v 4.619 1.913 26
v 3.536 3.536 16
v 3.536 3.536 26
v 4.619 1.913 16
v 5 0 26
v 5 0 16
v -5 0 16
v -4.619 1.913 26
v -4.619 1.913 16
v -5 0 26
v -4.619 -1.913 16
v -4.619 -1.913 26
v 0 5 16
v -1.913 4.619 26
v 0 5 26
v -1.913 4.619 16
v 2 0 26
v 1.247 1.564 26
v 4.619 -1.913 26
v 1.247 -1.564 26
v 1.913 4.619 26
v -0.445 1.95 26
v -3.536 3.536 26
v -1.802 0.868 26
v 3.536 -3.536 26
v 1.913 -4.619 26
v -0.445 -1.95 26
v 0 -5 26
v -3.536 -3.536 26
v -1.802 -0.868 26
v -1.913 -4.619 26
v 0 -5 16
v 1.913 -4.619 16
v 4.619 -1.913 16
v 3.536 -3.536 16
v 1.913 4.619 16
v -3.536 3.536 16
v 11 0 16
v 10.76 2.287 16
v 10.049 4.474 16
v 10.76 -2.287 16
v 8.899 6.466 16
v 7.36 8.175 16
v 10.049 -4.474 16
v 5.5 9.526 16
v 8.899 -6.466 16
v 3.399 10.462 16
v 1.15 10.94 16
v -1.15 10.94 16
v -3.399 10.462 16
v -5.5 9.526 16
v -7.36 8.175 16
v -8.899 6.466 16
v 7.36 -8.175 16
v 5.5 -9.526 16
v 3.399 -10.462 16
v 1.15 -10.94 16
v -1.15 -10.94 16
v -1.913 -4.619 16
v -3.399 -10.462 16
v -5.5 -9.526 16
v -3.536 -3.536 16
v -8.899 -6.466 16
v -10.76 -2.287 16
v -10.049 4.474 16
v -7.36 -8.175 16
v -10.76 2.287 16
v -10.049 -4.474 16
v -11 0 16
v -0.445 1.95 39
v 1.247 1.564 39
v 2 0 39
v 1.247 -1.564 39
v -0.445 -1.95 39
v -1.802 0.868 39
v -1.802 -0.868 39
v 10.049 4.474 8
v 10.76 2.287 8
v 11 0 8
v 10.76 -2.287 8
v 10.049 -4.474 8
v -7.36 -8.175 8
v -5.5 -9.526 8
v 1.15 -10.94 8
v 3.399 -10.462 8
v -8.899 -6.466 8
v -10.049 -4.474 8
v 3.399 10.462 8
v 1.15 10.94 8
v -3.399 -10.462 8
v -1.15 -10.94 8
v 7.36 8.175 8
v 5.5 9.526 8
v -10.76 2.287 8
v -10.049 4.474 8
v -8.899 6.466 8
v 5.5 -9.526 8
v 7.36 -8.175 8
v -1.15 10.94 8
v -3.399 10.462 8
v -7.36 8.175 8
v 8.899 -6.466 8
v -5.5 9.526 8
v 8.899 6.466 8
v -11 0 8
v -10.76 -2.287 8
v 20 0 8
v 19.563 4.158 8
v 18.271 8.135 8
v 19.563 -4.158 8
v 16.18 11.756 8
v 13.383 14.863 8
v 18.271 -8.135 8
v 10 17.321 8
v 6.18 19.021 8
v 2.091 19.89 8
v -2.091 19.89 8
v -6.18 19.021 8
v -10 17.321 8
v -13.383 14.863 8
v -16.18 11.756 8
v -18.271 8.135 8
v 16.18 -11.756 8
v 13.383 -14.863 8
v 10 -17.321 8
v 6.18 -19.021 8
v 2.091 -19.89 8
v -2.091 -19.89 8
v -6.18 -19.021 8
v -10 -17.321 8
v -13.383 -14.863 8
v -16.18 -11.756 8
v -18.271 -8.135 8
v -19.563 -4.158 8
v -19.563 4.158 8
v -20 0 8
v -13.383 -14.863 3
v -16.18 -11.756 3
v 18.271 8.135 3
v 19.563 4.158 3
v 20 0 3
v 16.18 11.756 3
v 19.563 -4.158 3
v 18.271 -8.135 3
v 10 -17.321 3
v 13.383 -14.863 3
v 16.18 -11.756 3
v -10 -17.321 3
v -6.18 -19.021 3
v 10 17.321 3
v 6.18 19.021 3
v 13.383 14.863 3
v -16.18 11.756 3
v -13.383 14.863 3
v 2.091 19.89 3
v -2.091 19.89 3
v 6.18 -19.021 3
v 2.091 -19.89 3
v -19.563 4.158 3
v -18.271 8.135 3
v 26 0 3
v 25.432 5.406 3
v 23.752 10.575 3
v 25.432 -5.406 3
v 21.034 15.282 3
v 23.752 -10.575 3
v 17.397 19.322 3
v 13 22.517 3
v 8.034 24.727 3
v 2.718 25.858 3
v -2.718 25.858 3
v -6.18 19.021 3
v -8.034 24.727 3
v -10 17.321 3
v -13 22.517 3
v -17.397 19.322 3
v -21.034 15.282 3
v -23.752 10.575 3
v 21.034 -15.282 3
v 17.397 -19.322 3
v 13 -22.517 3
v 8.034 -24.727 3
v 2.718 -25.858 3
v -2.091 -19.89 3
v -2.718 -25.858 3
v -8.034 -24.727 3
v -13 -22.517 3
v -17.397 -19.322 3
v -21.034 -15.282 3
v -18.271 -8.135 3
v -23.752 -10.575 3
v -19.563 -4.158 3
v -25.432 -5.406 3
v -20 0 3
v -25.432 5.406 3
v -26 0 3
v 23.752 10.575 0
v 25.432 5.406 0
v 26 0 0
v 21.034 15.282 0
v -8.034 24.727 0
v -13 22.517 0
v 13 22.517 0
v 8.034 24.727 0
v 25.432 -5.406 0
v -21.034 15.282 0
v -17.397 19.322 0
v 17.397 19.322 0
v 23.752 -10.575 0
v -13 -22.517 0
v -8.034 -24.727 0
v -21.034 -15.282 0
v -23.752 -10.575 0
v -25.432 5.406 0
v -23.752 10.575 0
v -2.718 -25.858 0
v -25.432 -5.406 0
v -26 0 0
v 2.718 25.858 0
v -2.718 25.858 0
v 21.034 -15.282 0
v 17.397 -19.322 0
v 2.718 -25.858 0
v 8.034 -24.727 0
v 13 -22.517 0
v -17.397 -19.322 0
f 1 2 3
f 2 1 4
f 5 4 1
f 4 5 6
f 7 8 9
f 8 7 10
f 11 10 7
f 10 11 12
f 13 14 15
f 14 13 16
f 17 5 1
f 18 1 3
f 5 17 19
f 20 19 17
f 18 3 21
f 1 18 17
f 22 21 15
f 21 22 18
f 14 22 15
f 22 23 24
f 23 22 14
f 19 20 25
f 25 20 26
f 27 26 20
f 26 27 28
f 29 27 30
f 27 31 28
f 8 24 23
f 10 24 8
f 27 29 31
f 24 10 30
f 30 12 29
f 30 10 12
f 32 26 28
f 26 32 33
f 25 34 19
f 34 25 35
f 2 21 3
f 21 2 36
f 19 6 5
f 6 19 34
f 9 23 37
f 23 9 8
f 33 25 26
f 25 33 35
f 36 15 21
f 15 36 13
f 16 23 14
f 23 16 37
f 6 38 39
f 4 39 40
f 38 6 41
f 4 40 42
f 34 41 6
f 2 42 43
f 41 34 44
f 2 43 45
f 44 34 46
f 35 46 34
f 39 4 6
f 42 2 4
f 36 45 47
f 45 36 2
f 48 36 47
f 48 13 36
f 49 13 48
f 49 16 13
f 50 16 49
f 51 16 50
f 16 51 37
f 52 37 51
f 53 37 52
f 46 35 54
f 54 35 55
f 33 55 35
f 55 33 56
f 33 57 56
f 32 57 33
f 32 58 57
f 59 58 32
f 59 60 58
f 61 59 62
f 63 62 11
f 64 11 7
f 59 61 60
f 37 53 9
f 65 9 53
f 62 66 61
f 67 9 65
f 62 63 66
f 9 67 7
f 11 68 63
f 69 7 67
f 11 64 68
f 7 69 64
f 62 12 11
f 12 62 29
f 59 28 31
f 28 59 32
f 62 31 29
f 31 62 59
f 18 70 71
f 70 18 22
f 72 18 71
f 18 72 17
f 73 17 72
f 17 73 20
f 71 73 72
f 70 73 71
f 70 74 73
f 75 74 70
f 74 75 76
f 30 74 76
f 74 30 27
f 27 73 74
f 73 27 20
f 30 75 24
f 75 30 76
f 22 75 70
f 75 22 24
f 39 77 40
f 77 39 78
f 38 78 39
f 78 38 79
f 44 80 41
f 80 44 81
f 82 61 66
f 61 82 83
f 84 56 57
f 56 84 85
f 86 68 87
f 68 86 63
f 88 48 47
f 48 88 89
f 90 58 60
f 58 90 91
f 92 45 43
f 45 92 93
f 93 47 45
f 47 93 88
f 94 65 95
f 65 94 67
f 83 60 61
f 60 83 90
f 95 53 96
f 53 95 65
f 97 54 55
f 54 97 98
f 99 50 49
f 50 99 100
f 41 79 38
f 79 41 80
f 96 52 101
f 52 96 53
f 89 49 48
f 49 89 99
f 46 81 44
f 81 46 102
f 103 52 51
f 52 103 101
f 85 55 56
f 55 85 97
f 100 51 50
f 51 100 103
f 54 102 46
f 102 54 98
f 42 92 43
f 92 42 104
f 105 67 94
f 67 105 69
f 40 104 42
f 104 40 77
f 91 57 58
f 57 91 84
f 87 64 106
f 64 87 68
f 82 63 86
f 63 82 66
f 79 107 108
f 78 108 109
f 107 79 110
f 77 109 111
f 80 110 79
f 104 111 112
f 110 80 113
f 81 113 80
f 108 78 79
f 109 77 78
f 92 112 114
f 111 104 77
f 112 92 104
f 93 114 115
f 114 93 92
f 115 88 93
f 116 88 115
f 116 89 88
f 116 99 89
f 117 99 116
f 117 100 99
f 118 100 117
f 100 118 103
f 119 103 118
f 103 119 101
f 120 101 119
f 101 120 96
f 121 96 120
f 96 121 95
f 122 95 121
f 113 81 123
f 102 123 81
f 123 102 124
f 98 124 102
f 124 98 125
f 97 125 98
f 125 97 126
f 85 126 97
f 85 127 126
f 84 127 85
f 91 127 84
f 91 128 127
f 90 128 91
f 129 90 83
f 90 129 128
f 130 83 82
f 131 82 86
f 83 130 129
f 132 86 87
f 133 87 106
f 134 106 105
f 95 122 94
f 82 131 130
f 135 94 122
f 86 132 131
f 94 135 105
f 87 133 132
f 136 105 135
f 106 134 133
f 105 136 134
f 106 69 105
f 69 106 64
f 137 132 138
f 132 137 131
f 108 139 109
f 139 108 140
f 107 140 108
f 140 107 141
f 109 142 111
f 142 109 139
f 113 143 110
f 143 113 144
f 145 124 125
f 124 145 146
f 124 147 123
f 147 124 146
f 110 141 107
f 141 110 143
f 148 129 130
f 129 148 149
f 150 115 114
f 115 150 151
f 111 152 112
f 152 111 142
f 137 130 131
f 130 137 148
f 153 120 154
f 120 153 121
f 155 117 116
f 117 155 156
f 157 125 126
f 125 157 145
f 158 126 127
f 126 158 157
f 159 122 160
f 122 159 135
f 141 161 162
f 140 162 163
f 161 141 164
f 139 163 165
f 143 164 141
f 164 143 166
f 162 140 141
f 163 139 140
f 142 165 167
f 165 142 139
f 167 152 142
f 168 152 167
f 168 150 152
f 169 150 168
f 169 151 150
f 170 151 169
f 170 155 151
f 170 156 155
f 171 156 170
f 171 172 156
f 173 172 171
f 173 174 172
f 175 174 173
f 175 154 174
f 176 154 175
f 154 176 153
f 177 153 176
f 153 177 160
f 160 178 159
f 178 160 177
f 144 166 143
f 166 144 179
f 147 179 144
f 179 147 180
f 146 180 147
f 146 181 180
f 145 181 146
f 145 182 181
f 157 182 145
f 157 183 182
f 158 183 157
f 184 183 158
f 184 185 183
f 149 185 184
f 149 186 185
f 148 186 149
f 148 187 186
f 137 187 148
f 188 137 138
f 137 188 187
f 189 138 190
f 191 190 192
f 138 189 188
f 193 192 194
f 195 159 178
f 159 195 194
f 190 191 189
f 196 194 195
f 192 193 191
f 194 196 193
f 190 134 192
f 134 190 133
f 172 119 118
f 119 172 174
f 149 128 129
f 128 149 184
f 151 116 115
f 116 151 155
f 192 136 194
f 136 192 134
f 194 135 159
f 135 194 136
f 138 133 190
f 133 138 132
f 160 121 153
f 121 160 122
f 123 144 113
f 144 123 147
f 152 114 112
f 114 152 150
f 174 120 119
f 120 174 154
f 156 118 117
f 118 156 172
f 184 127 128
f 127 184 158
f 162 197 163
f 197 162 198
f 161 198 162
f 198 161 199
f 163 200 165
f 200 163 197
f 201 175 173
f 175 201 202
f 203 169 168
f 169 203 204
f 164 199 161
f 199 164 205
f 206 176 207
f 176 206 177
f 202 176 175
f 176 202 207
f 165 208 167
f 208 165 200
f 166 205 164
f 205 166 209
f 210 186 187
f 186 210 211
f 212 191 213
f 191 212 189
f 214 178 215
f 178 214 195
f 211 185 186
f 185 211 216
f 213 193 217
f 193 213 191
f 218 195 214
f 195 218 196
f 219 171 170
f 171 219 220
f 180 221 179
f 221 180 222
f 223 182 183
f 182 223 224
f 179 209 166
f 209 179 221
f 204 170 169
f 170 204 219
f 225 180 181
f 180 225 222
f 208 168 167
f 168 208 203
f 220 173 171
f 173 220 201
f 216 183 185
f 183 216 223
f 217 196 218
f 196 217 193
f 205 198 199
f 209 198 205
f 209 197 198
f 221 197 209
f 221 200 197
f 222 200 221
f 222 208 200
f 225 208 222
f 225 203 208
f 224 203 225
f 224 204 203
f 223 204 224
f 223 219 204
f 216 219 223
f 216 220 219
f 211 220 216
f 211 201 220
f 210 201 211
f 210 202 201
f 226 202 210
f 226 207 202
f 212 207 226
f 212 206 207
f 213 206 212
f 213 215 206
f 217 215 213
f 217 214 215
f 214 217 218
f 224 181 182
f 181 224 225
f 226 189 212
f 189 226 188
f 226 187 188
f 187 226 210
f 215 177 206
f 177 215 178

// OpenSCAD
// https://en.wikibooks.org/wiki/OpenSCAD_User_Manual/Tips_and_Tricks#Stack_cylinders_on_top_of_each_other
// One option to solve this is by using a recursive module
// that creates a new translated coordinate system before
// going into the next level.
module StackedCylinders(size_vector, idx = 0) {
    if (idx < len(size_vector)) {
        radius = size_vector[idx][0];
        height = size_vector[idx][1];

        // Create the cylinder for the current level.
        cylinder(r = radius, h = height);

        // Recursive call generating the next cylinders
        // translated in Z direction based on the height
        // of the current cylinder
        translate([0, 0, height]) {
            StackedCylinders(size_vector, idx + 1);
        }
    }
}

// Define the sizes for the cylinders, first value is the
// radius, the second is the height.
// All cylinders are to be stacked above each other (with
// an additional spacing of 1 unit).
sizes = [ [ 26, 3 ], [ 20, 5 ], [ 11, 8 ],  [ 5, 10 ], [ 2, 13 ] ];

// Call the module to create the stacked cylinders.
StackedCylinders(sizes);
